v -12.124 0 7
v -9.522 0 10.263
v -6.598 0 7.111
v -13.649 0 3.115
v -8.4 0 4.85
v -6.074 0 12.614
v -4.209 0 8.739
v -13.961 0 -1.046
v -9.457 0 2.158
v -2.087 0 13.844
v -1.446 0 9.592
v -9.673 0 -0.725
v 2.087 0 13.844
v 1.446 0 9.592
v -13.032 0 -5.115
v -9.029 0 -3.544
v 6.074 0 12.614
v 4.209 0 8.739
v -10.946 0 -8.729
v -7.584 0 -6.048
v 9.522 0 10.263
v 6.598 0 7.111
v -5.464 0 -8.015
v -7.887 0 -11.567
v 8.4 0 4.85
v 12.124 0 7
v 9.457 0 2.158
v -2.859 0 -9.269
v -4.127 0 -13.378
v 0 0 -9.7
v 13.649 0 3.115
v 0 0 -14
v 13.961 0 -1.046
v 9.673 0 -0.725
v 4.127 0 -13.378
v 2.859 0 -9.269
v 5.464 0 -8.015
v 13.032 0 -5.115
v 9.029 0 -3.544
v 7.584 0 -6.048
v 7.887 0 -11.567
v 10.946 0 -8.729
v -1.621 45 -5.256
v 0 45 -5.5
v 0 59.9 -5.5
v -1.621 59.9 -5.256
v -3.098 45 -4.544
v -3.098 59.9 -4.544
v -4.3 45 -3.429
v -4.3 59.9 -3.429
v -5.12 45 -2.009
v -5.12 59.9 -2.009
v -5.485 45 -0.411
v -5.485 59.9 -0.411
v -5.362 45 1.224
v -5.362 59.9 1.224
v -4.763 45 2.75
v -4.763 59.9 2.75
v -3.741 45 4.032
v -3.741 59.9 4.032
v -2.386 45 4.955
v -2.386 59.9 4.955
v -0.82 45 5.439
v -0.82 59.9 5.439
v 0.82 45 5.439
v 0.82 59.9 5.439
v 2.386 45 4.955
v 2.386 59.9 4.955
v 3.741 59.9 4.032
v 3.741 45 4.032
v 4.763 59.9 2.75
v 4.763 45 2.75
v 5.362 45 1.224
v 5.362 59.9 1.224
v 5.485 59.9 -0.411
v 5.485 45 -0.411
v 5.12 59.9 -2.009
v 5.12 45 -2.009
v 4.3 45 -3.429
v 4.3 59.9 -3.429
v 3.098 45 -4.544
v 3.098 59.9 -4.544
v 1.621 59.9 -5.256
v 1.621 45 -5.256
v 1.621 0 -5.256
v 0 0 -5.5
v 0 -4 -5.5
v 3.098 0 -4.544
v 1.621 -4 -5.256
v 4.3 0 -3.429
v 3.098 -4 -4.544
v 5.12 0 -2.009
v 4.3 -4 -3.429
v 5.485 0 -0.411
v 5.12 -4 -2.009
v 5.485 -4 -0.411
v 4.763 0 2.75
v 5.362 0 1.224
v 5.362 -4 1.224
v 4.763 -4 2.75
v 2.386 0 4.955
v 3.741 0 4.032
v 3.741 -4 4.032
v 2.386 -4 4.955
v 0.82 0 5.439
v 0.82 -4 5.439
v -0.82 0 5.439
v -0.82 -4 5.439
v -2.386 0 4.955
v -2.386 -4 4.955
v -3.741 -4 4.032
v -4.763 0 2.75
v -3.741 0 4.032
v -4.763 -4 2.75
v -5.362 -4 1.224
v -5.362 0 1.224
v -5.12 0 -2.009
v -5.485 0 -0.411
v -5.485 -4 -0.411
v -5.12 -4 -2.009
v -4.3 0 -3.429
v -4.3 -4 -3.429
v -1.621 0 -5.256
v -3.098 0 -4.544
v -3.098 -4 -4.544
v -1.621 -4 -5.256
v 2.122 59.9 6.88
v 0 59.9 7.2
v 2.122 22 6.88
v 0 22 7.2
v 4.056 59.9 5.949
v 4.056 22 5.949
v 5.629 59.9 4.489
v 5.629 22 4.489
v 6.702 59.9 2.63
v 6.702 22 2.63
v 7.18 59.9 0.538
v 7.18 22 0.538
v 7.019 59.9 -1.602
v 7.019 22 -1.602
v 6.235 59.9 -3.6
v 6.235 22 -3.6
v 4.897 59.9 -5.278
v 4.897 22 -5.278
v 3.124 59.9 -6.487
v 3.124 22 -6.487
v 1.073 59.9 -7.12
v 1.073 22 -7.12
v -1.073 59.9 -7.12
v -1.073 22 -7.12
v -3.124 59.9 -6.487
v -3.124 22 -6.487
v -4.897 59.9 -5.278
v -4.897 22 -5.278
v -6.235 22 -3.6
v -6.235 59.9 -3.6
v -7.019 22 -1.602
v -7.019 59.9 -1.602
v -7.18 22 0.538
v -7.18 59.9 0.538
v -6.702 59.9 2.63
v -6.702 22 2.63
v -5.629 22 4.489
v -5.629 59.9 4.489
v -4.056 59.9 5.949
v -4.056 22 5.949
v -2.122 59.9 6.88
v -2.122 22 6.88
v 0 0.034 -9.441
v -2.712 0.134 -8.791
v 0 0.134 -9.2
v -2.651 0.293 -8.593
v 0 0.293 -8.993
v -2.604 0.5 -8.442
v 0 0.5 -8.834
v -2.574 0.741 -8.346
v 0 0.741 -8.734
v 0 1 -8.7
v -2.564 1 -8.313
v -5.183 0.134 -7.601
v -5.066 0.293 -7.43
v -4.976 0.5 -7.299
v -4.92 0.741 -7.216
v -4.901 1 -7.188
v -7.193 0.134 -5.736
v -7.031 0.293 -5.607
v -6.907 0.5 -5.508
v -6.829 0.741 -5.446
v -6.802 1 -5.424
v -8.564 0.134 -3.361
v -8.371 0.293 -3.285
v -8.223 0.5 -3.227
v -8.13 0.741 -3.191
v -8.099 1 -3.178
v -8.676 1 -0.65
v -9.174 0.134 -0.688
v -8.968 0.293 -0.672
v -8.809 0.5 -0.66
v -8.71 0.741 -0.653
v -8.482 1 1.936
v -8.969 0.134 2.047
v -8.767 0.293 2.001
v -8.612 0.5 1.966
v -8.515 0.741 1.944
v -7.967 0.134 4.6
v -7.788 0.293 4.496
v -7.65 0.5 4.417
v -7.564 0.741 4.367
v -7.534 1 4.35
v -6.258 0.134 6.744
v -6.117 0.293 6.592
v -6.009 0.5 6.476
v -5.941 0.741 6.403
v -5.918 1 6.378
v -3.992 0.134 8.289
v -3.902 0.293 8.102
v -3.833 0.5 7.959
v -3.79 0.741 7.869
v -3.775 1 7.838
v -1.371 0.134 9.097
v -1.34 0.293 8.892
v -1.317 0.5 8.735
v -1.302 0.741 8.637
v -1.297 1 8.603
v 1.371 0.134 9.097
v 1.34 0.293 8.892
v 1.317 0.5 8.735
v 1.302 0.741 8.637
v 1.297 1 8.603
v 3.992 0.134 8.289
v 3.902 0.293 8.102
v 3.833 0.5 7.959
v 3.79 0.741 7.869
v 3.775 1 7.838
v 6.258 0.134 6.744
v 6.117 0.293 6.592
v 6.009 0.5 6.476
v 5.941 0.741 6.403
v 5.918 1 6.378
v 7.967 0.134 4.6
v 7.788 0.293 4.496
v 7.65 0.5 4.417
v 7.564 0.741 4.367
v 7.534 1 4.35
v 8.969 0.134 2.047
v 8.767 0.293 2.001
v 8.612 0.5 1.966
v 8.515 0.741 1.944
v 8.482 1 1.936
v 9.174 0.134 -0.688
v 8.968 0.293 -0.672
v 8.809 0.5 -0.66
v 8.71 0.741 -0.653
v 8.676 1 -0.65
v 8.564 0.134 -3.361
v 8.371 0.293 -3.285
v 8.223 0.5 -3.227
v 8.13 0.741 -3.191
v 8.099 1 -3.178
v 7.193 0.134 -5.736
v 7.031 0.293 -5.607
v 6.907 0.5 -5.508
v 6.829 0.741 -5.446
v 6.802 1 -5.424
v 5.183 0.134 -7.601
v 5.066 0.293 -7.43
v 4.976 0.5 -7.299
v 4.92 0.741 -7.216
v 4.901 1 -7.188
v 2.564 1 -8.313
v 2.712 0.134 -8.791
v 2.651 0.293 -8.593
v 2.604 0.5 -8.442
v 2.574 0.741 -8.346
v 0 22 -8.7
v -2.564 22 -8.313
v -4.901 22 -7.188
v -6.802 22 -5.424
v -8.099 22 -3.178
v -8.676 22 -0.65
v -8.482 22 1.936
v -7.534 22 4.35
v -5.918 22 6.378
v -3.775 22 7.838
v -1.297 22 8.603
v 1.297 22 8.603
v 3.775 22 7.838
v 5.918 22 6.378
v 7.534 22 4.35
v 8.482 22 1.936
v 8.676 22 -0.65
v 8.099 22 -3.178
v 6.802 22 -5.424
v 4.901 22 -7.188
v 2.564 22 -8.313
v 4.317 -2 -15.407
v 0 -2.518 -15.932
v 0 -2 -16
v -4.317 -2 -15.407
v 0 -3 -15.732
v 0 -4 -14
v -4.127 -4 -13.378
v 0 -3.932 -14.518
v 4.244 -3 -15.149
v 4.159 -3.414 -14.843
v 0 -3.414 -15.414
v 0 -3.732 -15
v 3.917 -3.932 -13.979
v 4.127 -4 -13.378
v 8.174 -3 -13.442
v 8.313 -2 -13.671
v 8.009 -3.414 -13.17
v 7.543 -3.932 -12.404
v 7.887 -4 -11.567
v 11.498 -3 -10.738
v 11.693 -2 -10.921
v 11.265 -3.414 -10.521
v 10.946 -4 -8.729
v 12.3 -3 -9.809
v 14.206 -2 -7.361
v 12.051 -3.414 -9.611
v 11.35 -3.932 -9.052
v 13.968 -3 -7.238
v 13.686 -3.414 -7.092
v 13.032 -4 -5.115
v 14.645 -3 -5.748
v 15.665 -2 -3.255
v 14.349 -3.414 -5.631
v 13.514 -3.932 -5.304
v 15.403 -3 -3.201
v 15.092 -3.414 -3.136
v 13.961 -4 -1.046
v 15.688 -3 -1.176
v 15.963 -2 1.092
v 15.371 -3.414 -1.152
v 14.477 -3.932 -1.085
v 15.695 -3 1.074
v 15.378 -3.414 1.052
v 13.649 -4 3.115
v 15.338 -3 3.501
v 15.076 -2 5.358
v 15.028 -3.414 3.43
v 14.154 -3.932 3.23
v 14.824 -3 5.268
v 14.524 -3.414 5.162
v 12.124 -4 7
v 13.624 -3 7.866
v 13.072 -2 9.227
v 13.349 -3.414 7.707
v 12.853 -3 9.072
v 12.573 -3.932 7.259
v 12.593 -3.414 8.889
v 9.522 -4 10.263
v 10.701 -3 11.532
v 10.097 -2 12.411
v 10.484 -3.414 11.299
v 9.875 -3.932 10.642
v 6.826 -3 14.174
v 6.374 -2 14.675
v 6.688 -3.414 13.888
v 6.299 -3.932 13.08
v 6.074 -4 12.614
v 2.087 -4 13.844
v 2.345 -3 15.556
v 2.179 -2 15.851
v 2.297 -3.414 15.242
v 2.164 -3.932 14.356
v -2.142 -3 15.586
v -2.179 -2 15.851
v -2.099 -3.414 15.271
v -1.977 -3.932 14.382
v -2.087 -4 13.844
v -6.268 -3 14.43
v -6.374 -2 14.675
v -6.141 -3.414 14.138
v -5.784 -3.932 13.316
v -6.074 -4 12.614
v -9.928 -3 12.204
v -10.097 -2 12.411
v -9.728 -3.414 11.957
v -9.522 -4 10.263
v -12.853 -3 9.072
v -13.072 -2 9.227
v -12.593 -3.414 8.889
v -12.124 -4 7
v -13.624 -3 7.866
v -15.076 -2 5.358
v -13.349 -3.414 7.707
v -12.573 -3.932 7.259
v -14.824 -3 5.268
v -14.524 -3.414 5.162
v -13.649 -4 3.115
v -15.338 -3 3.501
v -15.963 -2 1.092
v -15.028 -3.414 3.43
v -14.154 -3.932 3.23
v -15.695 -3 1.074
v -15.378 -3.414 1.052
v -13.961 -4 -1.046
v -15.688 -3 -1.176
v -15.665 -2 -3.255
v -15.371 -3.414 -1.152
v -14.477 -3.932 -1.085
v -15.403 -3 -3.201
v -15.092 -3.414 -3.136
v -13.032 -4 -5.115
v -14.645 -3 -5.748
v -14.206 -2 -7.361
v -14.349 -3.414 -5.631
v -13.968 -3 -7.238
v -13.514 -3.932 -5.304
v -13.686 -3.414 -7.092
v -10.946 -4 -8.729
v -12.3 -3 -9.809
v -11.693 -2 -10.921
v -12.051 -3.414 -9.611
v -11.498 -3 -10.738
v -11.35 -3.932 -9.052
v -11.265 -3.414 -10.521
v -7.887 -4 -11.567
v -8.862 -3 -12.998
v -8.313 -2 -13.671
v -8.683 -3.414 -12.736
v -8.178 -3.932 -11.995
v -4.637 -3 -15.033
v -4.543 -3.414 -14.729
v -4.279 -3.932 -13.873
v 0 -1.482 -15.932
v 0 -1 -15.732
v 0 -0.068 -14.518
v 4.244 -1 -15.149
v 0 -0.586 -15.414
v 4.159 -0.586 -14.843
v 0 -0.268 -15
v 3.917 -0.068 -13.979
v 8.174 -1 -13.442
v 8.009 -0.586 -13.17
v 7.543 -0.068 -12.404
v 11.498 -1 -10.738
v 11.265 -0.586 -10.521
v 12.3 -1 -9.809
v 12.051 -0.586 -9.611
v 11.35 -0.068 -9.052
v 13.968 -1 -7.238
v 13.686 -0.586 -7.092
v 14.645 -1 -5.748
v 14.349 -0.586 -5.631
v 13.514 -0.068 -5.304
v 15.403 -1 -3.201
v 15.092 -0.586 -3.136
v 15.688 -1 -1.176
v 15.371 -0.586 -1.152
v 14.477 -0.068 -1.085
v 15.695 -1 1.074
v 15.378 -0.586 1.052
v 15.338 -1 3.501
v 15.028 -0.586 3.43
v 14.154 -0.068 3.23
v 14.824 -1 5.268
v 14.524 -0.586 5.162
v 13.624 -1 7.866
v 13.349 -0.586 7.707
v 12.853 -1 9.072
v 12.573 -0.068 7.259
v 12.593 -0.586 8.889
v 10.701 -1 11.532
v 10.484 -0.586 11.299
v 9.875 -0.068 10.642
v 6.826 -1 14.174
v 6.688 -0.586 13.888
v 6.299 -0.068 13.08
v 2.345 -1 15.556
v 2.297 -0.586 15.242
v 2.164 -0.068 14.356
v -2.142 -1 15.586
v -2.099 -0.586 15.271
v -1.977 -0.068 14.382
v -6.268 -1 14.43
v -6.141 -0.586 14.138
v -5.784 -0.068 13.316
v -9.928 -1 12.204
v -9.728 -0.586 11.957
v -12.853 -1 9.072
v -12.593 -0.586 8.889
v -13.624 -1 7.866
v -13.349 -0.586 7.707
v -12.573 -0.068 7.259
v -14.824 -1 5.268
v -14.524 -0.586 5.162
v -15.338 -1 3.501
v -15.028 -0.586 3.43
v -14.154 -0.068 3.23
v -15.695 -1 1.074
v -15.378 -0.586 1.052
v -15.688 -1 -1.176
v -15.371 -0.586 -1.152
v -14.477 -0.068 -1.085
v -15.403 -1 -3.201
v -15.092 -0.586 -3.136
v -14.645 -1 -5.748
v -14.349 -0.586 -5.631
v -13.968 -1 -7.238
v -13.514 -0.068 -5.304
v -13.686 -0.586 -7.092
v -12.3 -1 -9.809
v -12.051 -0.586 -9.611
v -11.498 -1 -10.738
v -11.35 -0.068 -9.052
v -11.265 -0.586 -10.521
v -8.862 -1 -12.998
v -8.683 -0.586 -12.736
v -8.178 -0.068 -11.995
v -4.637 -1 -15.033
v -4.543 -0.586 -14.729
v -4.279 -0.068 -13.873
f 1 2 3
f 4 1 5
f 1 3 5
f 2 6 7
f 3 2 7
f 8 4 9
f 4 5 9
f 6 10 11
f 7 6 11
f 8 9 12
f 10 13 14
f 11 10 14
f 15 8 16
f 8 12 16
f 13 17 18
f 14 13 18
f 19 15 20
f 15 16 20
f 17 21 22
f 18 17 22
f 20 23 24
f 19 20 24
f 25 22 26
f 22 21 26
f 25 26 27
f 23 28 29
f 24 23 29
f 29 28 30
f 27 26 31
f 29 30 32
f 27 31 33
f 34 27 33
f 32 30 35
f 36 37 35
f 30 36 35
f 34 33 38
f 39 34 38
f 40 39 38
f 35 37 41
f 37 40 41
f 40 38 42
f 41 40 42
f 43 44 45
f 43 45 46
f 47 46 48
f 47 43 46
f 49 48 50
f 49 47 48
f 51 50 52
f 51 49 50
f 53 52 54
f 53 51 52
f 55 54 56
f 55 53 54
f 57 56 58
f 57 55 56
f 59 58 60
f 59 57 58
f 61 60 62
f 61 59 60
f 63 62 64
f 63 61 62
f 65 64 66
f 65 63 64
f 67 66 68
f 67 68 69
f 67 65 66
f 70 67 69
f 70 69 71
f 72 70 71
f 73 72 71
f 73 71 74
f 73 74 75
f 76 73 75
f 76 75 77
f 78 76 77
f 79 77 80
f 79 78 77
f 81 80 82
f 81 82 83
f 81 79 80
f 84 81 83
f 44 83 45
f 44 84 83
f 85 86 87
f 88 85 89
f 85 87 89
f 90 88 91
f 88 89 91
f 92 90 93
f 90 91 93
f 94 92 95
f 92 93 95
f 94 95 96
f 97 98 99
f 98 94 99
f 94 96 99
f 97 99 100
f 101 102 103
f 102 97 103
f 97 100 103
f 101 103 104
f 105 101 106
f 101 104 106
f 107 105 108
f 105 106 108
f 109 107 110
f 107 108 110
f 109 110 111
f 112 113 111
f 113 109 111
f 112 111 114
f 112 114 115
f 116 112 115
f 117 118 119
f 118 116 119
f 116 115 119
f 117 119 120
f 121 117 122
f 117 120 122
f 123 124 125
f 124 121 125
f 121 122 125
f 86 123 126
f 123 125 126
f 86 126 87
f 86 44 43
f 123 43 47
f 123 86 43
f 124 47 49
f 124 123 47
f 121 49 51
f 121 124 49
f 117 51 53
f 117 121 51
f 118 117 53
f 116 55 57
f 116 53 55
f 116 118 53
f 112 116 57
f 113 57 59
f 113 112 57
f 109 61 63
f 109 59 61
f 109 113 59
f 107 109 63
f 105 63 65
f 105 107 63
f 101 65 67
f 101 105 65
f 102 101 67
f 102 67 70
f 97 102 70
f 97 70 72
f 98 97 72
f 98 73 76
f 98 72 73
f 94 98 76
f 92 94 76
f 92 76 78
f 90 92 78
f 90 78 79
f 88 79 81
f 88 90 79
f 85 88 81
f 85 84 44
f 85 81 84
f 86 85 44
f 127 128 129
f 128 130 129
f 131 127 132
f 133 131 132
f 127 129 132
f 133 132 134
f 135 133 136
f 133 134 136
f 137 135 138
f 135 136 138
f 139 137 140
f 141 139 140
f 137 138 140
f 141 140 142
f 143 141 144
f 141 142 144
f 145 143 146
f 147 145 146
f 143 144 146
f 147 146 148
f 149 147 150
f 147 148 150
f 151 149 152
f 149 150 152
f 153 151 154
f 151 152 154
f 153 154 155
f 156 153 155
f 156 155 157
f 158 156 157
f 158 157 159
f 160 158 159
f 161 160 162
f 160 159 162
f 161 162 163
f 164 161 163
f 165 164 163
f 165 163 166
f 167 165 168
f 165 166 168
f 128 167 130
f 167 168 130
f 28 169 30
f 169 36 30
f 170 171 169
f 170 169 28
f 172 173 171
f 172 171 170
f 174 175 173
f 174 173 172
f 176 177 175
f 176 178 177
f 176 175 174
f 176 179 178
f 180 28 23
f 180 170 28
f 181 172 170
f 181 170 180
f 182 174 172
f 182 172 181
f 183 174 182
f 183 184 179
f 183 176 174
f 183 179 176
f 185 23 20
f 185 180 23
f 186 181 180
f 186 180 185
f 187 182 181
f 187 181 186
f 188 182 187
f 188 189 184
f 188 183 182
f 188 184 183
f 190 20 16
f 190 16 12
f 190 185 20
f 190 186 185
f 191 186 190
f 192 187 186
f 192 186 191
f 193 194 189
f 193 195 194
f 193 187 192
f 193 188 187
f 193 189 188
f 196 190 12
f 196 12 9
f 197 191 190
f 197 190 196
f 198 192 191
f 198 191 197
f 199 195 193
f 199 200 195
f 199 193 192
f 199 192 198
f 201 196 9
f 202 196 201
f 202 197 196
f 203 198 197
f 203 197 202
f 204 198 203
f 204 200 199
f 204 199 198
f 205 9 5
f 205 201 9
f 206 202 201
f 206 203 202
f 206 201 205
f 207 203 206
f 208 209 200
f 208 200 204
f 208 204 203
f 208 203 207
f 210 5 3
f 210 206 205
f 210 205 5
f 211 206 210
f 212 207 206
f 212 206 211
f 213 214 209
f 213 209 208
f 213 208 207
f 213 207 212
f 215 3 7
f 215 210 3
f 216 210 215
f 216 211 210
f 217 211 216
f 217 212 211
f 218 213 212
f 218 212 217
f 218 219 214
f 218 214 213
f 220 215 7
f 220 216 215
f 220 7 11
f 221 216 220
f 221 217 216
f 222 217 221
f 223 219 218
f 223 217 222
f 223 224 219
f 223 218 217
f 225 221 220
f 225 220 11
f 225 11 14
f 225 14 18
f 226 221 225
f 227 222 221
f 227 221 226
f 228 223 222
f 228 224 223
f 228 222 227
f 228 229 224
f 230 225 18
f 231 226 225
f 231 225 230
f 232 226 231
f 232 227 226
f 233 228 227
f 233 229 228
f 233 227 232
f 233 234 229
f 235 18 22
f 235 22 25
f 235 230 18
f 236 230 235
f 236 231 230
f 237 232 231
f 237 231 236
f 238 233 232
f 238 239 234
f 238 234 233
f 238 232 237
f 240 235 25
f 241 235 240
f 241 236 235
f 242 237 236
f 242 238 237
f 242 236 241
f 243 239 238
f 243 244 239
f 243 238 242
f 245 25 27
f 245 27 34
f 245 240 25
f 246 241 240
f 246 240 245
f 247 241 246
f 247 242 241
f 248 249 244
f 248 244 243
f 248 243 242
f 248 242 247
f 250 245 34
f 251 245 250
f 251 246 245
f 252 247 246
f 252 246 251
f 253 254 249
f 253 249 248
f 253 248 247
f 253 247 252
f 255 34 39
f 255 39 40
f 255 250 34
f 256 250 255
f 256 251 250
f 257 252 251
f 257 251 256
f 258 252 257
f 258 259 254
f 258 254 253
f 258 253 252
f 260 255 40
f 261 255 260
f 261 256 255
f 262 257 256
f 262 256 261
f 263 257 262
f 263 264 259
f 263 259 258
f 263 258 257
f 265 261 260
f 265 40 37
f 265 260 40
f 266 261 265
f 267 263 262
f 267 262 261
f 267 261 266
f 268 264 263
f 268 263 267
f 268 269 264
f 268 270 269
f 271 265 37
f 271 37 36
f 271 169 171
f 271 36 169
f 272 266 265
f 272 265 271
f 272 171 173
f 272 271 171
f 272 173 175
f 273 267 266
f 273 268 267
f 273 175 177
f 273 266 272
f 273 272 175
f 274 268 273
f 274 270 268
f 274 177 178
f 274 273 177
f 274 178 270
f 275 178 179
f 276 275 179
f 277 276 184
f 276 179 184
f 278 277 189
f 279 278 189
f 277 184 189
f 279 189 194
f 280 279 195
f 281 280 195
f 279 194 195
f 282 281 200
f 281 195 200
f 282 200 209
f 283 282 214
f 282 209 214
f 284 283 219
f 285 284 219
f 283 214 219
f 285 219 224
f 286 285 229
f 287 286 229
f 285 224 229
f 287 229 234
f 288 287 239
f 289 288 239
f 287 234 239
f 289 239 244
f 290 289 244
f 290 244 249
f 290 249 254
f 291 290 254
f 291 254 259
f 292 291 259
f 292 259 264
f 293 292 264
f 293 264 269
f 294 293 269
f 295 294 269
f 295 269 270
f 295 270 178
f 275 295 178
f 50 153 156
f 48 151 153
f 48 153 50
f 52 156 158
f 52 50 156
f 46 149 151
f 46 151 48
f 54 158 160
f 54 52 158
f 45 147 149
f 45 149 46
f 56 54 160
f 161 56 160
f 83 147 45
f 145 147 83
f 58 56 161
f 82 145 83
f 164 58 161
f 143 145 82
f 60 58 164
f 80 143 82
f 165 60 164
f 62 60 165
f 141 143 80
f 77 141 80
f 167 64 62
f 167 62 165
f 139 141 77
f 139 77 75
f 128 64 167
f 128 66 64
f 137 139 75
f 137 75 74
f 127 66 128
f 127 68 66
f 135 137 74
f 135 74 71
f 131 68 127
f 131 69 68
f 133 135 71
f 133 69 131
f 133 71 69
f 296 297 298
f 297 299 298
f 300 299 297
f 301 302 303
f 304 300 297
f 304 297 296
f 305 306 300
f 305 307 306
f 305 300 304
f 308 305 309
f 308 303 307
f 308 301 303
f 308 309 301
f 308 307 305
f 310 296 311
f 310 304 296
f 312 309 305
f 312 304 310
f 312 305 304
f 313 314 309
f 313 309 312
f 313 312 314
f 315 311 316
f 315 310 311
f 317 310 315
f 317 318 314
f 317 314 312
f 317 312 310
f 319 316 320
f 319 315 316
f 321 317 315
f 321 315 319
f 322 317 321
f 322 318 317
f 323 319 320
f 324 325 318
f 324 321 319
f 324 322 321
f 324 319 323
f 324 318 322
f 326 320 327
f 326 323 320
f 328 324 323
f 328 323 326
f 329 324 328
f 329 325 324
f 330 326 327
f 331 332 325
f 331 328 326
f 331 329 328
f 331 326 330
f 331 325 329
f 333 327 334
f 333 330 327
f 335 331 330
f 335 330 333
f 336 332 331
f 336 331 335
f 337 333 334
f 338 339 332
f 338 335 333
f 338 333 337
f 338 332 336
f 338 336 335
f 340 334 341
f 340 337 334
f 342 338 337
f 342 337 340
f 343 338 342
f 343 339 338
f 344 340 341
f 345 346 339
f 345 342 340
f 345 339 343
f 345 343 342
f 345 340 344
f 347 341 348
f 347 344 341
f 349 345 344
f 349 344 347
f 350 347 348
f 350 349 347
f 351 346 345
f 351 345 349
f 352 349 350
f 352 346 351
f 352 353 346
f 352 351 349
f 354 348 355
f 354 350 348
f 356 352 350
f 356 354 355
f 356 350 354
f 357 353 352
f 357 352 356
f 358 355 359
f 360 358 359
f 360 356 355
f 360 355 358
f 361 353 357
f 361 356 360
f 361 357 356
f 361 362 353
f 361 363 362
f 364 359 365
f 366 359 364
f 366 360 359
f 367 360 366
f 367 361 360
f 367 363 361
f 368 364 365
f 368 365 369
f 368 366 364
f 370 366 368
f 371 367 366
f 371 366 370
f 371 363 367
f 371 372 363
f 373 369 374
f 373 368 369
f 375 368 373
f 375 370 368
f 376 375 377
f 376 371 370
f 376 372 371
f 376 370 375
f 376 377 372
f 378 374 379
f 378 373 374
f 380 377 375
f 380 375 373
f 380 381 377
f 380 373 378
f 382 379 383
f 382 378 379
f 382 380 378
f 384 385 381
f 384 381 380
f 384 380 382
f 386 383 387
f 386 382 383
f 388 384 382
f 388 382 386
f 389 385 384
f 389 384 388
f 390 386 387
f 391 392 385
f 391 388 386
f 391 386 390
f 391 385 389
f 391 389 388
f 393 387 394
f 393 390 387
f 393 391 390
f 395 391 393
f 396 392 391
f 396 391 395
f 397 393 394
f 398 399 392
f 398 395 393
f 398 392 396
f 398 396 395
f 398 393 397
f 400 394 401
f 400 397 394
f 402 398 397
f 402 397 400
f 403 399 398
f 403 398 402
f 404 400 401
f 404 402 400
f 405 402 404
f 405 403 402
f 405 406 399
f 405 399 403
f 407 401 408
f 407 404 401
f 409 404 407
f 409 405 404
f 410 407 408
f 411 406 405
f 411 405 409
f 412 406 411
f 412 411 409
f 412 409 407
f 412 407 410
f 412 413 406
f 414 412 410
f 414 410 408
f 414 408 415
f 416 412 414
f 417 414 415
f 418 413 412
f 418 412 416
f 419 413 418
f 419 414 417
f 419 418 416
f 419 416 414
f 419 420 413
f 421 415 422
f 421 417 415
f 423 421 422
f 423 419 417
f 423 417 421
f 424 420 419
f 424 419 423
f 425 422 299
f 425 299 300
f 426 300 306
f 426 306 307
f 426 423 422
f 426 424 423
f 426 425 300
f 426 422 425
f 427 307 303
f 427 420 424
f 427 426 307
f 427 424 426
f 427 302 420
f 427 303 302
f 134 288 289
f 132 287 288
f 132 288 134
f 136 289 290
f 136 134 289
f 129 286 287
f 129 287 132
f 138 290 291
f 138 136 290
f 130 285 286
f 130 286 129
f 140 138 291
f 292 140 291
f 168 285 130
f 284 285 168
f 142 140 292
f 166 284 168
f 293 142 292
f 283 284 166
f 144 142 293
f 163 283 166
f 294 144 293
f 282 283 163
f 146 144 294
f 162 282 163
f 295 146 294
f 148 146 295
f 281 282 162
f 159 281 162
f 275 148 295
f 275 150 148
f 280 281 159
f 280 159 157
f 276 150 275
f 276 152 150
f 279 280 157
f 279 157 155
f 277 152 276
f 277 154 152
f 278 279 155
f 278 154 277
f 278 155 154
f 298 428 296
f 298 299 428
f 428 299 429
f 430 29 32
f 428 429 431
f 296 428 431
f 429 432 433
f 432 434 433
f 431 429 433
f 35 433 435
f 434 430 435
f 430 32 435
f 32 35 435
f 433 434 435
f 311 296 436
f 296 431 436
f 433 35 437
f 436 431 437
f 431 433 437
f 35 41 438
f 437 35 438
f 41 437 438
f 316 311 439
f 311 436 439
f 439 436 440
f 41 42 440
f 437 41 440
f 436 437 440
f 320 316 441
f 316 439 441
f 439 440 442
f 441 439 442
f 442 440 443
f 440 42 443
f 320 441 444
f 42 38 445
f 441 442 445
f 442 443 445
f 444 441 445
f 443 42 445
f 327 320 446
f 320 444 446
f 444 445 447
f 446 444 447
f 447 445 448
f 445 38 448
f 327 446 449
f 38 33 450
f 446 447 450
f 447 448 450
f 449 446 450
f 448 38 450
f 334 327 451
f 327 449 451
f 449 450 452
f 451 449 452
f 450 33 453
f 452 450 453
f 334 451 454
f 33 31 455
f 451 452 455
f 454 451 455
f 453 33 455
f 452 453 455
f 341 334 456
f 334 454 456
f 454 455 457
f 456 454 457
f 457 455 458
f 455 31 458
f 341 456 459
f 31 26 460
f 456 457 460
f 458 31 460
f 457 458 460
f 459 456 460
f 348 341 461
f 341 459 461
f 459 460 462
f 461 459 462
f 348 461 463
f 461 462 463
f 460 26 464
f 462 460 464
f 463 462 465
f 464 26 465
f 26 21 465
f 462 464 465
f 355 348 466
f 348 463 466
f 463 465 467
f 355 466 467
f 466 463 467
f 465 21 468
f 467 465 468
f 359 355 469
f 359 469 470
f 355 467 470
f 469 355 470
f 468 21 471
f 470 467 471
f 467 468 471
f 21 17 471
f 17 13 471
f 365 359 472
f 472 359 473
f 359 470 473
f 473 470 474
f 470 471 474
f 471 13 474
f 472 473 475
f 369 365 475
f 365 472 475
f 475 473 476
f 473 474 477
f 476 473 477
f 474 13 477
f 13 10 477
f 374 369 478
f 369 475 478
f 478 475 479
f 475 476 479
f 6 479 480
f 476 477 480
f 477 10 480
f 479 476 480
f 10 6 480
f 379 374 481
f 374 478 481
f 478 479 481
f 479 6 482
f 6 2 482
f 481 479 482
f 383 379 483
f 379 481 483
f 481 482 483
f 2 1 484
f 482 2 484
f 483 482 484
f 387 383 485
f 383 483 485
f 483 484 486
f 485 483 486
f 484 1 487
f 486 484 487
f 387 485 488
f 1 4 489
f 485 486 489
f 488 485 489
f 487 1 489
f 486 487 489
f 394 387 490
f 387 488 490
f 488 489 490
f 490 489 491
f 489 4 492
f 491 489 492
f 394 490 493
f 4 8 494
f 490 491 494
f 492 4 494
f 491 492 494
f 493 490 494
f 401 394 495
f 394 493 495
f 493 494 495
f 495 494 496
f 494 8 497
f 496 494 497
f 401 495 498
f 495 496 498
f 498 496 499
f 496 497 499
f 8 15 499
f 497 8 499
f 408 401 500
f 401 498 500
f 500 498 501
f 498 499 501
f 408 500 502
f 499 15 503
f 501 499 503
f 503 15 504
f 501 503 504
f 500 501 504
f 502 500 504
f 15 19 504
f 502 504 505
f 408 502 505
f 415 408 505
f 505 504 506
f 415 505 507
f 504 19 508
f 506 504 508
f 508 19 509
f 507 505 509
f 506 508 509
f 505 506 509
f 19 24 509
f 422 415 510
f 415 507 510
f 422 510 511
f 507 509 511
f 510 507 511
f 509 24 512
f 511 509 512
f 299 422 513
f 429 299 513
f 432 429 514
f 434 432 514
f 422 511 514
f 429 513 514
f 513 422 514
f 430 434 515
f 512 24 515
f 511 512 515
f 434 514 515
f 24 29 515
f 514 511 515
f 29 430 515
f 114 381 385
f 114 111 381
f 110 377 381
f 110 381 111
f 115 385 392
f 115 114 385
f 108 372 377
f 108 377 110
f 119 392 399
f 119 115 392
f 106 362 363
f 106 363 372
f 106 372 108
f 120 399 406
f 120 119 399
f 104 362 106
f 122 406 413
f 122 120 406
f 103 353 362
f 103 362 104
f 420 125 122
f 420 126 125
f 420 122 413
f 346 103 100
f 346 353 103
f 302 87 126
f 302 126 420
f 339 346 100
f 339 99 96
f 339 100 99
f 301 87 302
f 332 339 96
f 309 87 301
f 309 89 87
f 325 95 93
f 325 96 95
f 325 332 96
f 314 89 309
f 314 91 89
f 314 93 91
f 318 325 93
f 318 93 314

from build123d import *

# Parameters (mm, degrees)
SKETCH1_R           = 8.7
SKETCH1_R_2         = 5.5
BOSS_EXTRUDE1_DEPTH = 68.8
BOSS_EXTRUDE2_START = 4
SKETCH2_R           = 16
SKETCH2_R_2         = 5.5
BOSS_EXTRUDE2_DEPTH = 4
FILLET1_R           = 2
FILLET2_R           = 1
BOSS_EXTRUDE6_START = -10
BOSS_EXTRUDE6_DEPTH = 10
CUT_EXTRUDE1_START  = -23
SKETCH10_R          = 8.7
SKETCH10_R_2        = 7.2
CUT_EXTRUDE1_DEPTH  = 23
SKETCH11_R          = 17.428070689
CUT_EXTRUDE2_DEPTH  = 54.972215104
SKETCH12_R          = 7.2
SKETCH12_R_2        = 5.5
BOSS_EXTRUDE7_DEPTH = 14.9


with BuildPart() as part:
    # Sketch1 → Boss-Extrude1 (new body)
    with BuildSketch(Plane(origin=(0, 0, 0), x_dir=(1, 0, 0), z_dir=(0, 1, 0))):
        with Locations(Location((0, 0, 0), (0, 0, 90))):
            Circle(SKETCH1_R)
        with Locations(Location((0, 0, 0), (0, 0, 90))):
            Circle(SKETCH1_R_2, mode=Mode.SUBTRACT)
    extrude(amount=BOSS_EXTRUDE1_DEPTH)

    # Sketch2 → Boss-Extrude2 (add)
    with BuildSketch(Plane.XZ.offset(BOSS_EXTRUDE2_START)):
        with Locations(Location((0, 0, 0), (0, 0, 270))):
            Circle(SKETCH2_R)
        with Locations(Location((0, 0, 0), (0, 0, 270))):
            Circle(SKETCH2_R_2, mode=Mode.SUBTRACT)
    extrude(amount=-BOSS_EXTRUDE2_DEPTH)

    # Fillet1
    fillet1_edges = [part.edges().sort_by_distance(p)[0] for p in [
        (0, 0, 16),
        (0, -4, 16),
    ]]
    fillet(fillet1_edges, radius=FILLET1_R - 0.0001)  # a hair under: the kernel refuses the full size

    # Fillet2
    fillet2_edges = [part.edges().sort_by_distance(p)[0] for p in [
        (0, 0, 8.7),
    ]]
    fillet(fillet2_edges, radius=FILLET2_R)

    # Sketch7 → Boss-Extrude6 (add)
    with BuildSketch(Plane(origin=(0, 68.8, 0), x_dir=(1, 0, 0), z_dir=(0, 1, 0)).offset(BOSS_EXTRUDE6_START)):
        with BuildLine():
            Line((-8.459778344, -2.030307951), (-9.805994948, -2.807572454))
            ThreePointArc((-9.805994948, -2.807572454), (-8.832386986, -5.101856537), (-7.331446138, -7.091537035))
            Line((-7.331446138, -7.091537035), (-5.988187435, -6.311228981))
            ThreePointArc((-5.988187435, -6.311228981), (-7.534421013, -4.35), (-8.459778344, -2.030307951))
        make_face()
        with BuildLine():
            Line((-2.471590909, 8.341536931), (-2.475728155, 9.89498712))
            ThreePointArc((-2.475728155, 9.89498712), (0, 10.2), (2.475728155, 9.89498712))
            Line((2.475728155, 9.89498712), (2.471590909, 8.341536931))
            ThreePointArc((2.471590909, 8.341536931), (0, 8.7), (-2.471590909, 8.341536931))
        make_face()
        with BuildLine():
            Line((8.459778344, -2.030307951), (9.807174294, -2.803450085))
            ThreePointArc((9.807174294, -2.803450085), (8.833459119, -5.1), (7.331446138, -7.091537035))
            Line((7.331446138, -7.091537035), (5.988187435, -6.311228981))
            ThreePointArc((5.988187435, -6.311228981), (7.534421013, -4.35), (8.459778344, -2.030307951))
        make_face()
    extrude(amount=BOSS_EXTRUDE6_DEPTH)

    # Sketch10 → Cut-Extrude1 (cut)
    with BuildSketch(Plane(origin=(0, 45, 0), x_dir=(1, 0, 0), z_dir=(0, 1, 0)).offset(CUT_EXTRUDE1_START)):
        with Locations(Location((0, 0, 0), (0, 0, 90))):
            Circle(SKETCH10_R)
        with Locations(Location((0, 0, 0), (0, 0, 270))):
            Circle(SKETCH10_R_2, mode=Mode.SUBTRACT)
    extrude(amount=CUT_EXTRUDE1_DEPTH, mode=Mode.SUBTRACT)

    # Sketch11 → Cut-Extrude2 (cut, through all)
    with BuildSketch(Plane.XZ.offset(-45)):
        Circle(SKETCH11_R)
    extrude(amount=-CUT_EXTRUDE2_DEPTH, mode=Mode.SUBTRACT)

    # Sketch12 → Boss-Extrude7 (add)
    with BuildSketch(Plane(origin=(0, 45, 0), x_dir=(1, 0, 0), z_dir=(0, 1, 0))):
        with Locations(Location((0, 0, 0), (0, 0, 270))):
            Circle(SKETCH12_R)
        with Locations(Location((0, 0, 0), (0, 0, 90))):
            Circle(SKETCH12_R_2, mode=Mode.SUBTRACT)
    extrude(amount=BOSS_EXTRUDE7_DEPTH)


solid = part.part
